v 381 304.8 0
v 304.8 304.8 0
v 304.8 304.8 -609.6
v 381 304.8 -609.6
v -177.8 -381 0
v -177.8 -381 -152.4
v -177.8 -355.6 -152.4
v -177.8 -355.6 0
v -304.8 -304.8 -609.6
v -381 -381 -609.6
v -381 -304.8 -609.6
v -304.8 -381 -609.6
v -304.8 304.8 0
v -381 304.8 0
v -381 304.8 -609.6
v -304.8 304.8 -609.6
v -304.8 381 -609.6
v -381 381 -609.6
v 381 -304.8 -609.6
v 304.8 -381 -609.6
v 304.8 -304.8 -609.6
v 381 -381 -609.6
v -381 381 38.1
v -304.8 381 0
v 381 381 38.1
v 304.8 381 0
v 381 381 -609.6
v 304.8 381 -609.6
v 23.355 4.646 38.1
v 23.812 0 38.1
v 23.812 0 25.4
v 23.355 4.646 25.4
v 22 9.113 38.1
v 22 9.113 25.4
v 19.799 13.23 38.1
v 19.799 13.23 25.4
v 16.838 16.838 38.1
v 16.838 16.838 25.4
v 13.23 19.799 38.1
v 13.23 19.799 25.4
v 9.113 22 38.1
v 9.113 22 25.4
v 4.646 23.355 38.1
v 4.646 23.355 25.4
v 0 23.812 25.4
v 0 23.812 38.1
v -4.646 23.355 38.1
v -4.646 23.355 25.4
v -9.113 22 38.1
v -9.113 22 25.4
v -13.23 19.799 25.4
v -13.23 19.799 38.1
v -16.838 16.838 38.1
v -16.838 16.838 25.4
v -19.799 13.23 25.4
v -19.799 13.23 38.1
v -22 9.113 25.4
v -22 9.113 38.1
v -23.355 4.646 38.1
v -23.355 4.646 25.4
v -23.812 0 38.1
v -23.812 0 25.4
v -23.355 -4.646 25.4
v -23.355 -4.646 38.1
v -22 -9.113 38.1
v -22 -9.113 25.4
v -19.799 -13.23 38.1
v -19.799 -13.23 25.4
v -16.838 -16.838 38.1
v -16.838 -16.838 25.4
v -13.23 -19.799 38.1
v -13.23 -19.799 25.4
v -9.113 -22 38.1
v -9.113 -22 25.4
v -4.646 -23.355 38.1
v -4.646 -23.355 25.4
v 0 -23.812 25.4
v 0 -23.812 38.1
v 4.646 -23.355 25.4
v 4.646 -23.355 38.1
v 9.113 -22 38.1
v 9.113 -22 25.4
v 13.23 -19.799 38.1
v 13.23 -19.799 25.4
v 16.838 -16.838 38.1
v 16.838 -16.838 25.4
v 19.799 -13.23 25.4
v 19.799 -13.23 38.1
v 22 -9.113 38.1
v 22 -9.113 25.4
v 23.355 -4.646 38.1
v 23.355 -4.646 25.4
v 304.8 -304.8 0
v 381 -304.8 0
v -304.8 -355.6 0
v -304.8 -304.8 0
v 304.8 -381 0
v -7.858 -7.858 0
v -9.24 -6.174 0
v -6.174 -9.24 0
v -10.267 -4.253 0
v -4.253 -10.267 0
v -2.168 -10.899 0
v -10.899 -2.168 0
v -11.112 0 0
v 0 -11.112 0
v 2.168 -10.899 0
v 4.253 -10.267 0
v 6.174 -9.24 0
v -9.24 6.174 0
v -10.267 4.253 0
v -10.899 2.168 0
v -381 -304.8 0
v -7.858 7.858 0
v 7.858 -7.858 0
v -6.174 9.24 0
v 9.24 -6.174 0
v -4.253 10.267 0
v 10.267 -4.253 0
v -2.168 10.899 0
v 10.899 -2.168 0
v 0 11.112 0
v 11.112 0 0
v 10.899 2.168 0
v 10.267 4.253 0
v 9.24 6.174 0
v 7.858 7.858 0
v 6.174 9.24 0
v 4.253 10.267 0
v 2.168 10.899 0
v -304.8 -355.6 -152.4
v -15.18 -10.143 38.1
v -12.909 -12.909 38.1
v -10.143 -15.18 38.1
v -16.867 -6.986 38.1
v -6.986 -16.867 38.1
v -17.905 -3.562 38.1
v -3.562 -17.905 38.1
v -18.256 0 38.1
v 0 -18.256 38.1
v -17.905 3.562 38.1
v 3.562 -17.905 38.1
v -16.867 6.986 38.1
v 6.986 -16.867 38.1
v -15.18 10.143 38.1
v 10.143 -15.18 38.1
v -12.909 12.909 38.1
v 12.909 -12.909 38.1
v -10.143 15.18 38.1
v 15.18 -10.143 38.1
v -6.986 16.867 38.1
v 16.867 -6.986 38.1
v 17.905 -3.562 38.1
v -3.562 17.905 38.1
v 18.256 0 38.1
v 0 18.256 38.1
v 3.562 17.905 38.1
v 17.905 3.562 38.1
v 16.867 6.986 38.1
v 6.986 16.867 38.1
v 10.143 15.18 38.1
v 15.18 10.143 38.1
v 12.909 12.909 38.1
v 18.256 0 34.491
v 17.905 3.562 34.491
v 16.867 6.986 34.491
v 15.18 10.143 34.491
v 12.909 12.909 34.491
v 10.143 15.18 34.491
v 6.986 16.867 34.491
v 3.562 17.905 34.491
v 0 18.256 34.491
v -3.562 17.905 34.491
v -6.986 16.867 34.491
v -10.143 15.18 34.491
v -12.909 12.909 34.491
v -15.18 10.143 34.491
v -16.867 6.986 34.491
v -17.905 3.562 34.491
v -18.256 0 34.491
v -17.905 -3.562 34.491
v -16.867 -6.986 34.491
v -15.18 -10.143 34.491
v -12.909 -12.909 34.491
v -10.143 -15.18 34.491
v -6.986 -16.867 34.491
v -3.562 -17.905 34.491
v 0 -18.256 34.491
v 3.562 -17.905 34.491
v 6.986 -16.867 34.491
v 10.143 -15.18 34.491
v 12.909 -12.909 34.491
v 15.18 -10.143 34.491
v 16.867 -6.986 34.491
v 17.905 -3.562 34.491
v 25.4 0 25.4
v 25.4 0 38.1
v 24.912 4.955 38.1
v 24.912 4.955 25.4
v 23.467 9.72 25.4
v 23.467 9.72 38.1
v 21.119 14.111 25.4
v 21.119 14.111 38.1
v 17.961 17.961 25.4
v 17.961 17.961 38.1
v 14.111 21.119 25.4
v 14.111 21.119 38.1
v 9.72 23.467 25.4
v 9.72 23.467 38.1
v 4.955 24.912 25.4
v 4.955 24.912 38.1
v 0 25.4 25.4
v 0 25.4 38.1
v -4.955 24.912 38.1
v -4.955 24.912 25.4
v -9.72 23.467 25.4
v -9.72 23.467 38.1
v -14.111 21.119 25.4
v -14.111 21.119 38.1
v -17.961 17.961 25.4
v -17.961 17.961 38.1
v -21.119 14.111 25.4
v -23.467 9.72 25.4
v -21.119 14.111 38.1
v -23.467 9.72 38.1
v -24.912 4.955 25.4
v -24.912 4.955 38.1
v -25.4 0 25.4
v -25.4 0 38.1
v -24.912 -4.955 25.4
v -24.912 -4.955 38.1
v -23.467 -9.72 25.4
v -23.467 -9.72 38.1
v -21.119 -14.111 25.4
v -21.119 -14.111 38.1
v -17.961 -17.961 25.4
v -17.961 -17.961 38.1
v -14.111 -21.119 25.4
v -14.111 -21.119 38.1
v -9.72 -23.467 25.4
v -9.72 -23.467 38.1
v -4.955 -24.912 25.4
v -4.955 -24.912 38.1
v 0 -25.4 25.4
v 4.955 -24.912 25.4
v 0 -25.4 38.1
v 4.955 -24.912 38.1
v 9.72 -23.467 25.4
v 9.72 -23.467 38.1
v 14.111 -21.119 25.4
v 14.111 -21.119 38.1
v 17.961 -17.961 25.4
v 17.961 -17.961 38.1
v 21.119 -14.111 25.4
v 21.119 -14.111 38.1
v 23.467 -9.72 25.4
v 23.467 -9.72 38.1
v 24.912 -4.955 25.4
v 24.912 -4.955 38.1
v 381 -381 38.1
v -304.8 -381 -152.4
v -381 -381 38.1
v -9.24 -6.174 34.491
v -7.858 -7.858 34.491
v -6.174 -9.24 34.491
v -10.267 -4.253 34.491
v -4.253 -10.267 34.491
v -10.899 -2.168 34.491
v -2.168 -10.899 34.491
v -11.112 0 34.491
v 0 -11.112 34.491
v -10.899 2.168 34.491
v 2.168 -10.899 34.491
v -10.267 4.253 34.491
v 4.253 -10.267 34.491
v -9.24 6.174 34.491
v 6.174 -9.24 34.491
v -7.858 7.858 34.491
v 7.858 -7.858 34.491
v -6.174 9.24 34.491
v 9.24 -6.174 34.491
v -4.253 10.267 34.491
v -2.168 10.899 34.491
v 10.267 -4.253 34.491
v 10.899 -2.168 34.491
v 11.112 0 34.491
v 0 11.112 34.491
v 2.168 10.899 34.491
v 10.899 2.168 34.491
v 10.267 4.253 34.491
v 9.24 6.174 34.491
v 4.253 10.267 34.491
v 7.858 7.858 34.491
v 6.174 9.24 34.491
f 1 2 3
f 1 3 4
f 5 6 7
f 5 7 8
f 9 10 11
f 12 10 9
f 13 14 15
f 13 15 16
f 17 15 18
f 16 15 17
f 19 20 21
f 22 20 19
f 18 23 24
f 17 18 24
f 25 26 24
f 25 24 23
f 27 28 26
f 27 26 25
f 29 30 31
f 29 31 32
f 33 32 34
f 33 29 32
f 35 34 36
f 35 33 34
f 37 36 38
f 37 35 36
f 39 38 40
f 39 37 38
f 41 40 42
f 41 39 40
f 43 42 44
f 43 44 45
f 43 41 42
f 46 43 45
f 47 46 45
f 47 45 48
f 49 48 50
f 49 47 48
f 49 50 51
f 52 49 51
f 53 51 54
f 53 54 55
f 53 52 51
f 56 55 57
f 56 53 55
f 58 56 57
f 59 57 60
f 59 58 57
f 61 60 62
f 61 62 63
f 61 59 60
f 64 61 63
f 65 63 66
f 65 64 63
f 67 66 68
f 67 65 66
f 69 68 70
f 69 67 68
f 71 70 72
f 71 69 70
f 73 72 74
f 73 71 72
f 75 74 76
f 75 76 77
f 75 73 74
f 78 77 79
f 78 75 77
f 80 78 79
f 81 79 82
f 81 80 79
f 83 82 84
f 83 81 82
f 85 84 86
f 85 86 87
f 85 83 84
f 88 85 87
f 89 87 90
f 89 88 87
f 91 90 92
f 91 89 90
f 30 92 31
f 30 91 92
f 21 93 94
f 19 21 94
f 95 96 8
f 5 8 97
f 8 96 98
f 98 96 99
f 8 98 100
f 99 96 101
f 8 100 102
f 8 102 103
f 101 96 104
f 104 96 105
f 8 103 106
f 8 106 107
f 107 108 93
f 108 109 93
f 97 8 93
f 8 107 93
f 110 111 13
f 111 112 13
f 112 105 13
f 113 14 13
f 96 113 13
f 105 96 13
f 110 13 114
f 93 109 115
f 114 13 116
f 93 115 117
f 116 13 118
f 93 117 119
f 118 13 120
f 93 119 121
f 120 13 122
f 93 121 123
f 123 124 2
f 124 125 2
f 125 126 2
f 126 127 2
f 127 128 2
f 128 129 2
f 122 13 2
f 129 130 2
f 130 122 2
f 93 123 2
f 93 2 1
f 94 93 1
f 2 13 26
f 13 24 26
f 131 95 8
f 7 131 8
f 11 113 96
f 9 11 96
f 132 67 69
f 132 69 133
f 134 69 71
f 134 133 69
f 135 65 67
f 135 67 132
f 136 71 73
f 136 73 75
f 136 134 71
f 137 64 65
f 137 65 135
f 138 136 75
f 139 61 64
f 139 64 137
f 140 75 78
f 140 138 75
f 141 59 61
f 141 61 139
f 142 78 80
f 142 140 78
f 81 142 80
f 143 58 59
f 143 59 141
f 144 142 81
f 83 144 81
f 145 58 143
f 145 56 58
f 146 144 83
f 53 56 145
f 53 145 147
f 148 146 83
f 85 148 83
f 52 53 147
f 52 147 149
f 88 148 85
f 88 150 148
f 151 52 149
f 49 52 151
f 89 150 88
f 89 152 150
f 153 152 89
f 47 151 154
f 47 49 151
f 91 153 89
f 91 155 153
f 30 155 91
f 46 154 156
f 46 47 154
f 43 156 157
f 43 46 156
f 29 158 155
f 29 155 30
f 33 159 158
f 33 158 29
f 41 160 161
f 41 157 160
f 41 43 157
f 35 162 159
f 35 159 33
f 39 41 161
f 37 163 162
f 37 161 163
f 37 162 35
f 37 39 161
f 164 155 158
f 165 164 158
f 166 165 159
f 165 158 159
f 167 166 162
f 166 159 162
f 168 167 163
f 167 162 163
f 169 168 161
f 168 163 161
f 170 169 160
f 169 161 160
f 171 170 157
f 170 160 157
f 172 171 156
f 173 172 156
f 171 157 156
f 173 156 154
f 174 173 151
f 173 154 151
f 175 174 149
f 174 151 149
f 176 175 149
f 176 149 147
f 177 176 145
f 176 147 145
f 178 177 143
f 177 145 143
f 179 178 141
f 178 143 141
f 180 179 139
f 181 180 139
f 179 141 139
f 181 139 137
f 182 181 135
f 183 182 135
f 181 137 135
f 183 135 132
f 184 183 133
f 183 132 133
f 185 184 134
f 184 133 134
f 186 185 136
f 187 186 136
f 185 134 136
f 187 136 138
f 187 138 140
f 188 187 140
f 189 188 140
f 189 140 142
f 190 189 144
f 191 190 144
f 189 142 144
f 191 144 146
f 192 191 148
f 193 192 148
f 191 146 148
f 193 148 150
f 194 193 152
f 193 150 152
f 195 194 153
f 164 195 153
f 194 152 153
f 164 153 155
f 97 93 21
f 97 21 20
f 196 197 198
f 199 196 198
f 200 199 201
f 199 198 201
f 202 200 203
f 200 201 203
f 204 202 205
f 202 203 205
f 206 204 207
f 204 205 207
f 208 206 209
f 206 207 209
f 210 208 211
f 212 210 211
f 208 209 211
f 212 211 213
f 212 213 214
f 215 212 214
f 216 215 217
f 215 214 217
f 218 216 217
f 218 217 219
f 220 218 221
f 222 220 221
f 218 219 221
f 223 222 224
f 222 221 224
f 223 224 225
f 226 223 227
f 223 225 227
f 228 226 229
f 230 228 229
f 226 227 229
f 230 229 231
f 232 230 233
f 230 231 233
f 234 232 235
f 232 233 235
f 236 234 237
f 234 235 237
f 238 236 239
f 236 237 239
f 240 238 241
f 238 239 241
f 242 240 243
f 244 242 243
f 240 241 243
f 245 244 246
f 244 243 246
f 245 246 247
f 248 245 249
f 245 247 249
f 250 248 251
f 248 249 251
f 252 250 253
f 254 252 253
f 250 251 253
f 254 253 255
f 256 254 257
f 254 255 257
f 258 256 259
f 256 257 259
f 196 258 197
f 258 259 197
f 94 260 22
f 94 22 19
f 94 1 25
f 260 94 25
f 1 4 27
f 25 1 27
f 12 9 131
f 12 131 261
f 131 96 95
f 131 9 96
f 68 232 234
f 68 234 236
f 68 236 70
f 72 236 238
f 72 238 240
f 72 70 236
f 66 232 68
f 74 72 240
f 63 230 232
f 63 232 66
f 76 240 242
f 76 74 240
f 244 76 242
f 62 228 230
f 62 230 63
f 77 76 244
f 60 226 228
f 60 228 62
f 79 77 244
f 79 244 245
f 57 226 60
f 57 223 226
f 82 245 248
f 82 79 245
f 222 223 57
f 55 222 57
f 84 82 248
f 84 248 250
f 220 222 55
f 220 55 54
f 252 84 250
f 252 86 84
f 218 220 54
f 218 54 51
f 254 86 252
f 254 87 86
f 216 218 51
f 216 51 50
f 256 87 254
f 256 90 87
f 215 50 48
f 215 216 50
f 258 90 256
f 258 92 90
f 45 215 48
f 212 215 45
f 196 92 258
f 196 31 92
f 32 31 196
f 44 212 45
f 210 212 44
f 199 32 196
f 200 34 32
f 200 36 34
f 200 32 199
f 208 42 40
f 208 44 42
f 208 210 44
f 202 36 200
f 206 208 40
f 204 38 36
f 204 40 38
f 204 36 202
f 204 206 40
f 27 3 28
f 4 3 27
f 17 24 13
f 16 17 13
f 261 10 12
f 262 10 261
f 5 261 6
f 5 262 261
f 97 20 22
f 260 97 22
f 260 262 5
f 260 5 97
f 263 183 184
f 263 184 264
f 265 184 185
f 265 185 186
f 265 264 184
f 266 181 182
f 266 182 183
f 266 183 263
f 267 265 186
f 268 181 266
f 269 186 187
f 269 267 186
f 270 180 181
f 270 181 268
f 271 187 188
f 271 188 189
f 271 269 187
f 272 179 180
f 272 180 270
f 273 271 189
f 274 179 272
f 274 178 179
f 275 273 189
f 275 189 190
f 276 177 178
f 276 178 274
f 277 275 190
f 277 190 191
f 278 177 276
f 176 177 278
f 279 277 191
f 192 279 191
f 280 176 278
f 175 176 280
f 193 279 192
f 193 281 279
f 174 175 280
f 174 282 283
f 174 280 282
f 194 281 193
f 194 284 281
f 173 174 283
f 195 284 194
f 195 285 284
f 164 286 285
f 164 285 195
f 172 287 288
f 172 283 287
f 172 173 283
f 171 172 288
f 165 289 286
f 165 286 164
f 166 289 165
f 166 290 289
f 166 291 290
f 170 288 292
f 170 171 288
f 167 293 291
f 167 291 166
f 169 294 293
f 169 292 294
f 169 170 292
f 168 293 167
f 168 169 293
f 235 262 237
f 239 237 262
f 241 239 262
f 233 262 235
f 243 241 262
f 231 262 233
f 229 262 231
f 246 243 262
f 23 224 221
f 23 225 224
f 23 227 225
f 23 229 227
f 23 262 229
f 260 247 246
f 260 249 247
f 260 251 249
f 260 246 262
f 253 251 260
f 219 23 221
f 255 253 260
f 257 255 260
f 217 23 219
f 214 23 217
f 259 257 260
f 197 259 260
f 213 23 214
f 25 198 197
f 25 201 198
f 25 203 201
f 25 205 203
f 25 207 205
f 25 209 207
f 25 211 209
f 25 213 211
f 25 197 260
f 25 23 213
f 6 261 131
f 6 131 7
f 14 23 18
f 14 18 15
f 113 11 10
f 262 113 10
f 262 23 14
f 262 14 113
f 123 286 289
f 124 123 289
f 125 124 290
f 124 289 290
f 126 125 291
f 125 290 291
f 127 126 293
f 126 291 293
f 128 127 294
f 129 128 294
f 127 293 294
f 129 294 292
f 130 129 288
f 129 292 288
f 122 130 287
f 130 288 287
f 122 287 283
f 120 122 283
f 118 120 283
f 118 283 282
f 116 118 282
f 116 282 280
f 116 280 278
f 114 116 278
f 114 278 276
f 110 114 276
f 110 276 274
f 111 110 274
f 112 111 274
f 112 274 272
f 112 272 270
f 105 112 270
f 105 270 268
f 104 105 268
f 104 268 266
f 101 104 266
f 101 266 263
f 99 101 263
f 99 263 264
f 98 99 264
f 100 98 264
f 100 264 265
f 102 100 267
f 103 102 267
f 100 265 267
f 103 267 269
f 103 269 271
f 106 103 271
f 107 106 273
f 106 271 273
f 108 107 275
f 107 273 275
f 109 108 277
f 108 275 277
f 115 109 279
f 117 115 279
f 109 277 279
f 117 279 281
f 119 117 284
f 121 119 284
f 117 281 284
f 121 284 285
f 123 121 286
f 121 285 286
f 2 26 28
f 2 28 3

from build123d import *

# Parameters (mm, degrees)
F0_W      = 762
F0_H      = 762
F1_DEPTH  = 38.1
F2_W      = 76.2
F2_H      = 76.2
F3_DEPTH  = 609.6
F4_R      = 18.25625
F5_DEPTH  = 3.60934
F6_R      = 11.1125
F7_DEPTH  = 644.09166
F9_R      = 25.4
F9_R_2    = 23.8125
F10_DEPTH = 12.7
F11_W     = 127
F11_H     = 152.4
F12_DEPTH = 25.4


# Not quite as in the source:
# - a feature of the source that left no trace in its solid (it failed there, or was rolled back) is left out


with BuildPart() as f1:
    # F0 (on Top) → F1 (new body)
    with BuildSketch(Plane.XY):
        Rectangle(F0_W, F0_H)
    extrude(amount=F1_DEPTH)

    # F2 (on face) → F3 (join)
    with BuildSketch(Plane(origin=(0, 0, 0), x_dir=(1, 0, 0), z_dir=(0, 0, -1))):
        with Locations((-342.9, 342.9)):
            Rectangle(F2_W, F2_H)
        with Locations((342.9, 342.9)):
            Rectangle(F2_W, F2_H)
        with Locations((342.9, -342.9)):
            Rectangle(F2_W, F2_H)
        with Locations((-342.9, -342.9)):
            Rectangle(F2_W, F2_H)
    extrude(amount=F3_DEPTH)

    # F4 (on face) → F5 (cut)
    with BuildSketch(Plane.XY.offset(38.1)):
        Circle(F4_R)
    extrude(amount=-F5_DEPTH, mode=Mode.SUBTRACT)

    # F6 (on face) → F7 (cut, through all)
    with BuildSketch(Plane.XY.offset(34.49066)):
        Circle(F6_R)
    extrude(amount=-F7_DEPTH, mode=Mode.SUBTRACT)

    # F9 (on face) → F10 (cut)
    with BuildSketch(Plane.XY.offset(38.1)):
        Circle(F9_R)
        Circle(F9_R_2, mode=Mode.SUBTRACT)
    extrude(amount=-F10_DEPTH, mode=Mode.SUBTRACT)

    # F11 (on face) → F12 (join)
    with BuildSketch(Plane.XZ.offset(381)):
        with Locations((-241.3, -76.2)):
            Rectangle(F11_W, F11_H)
    extrude(amount=-F12_DEPTH)


solid = f1.part
